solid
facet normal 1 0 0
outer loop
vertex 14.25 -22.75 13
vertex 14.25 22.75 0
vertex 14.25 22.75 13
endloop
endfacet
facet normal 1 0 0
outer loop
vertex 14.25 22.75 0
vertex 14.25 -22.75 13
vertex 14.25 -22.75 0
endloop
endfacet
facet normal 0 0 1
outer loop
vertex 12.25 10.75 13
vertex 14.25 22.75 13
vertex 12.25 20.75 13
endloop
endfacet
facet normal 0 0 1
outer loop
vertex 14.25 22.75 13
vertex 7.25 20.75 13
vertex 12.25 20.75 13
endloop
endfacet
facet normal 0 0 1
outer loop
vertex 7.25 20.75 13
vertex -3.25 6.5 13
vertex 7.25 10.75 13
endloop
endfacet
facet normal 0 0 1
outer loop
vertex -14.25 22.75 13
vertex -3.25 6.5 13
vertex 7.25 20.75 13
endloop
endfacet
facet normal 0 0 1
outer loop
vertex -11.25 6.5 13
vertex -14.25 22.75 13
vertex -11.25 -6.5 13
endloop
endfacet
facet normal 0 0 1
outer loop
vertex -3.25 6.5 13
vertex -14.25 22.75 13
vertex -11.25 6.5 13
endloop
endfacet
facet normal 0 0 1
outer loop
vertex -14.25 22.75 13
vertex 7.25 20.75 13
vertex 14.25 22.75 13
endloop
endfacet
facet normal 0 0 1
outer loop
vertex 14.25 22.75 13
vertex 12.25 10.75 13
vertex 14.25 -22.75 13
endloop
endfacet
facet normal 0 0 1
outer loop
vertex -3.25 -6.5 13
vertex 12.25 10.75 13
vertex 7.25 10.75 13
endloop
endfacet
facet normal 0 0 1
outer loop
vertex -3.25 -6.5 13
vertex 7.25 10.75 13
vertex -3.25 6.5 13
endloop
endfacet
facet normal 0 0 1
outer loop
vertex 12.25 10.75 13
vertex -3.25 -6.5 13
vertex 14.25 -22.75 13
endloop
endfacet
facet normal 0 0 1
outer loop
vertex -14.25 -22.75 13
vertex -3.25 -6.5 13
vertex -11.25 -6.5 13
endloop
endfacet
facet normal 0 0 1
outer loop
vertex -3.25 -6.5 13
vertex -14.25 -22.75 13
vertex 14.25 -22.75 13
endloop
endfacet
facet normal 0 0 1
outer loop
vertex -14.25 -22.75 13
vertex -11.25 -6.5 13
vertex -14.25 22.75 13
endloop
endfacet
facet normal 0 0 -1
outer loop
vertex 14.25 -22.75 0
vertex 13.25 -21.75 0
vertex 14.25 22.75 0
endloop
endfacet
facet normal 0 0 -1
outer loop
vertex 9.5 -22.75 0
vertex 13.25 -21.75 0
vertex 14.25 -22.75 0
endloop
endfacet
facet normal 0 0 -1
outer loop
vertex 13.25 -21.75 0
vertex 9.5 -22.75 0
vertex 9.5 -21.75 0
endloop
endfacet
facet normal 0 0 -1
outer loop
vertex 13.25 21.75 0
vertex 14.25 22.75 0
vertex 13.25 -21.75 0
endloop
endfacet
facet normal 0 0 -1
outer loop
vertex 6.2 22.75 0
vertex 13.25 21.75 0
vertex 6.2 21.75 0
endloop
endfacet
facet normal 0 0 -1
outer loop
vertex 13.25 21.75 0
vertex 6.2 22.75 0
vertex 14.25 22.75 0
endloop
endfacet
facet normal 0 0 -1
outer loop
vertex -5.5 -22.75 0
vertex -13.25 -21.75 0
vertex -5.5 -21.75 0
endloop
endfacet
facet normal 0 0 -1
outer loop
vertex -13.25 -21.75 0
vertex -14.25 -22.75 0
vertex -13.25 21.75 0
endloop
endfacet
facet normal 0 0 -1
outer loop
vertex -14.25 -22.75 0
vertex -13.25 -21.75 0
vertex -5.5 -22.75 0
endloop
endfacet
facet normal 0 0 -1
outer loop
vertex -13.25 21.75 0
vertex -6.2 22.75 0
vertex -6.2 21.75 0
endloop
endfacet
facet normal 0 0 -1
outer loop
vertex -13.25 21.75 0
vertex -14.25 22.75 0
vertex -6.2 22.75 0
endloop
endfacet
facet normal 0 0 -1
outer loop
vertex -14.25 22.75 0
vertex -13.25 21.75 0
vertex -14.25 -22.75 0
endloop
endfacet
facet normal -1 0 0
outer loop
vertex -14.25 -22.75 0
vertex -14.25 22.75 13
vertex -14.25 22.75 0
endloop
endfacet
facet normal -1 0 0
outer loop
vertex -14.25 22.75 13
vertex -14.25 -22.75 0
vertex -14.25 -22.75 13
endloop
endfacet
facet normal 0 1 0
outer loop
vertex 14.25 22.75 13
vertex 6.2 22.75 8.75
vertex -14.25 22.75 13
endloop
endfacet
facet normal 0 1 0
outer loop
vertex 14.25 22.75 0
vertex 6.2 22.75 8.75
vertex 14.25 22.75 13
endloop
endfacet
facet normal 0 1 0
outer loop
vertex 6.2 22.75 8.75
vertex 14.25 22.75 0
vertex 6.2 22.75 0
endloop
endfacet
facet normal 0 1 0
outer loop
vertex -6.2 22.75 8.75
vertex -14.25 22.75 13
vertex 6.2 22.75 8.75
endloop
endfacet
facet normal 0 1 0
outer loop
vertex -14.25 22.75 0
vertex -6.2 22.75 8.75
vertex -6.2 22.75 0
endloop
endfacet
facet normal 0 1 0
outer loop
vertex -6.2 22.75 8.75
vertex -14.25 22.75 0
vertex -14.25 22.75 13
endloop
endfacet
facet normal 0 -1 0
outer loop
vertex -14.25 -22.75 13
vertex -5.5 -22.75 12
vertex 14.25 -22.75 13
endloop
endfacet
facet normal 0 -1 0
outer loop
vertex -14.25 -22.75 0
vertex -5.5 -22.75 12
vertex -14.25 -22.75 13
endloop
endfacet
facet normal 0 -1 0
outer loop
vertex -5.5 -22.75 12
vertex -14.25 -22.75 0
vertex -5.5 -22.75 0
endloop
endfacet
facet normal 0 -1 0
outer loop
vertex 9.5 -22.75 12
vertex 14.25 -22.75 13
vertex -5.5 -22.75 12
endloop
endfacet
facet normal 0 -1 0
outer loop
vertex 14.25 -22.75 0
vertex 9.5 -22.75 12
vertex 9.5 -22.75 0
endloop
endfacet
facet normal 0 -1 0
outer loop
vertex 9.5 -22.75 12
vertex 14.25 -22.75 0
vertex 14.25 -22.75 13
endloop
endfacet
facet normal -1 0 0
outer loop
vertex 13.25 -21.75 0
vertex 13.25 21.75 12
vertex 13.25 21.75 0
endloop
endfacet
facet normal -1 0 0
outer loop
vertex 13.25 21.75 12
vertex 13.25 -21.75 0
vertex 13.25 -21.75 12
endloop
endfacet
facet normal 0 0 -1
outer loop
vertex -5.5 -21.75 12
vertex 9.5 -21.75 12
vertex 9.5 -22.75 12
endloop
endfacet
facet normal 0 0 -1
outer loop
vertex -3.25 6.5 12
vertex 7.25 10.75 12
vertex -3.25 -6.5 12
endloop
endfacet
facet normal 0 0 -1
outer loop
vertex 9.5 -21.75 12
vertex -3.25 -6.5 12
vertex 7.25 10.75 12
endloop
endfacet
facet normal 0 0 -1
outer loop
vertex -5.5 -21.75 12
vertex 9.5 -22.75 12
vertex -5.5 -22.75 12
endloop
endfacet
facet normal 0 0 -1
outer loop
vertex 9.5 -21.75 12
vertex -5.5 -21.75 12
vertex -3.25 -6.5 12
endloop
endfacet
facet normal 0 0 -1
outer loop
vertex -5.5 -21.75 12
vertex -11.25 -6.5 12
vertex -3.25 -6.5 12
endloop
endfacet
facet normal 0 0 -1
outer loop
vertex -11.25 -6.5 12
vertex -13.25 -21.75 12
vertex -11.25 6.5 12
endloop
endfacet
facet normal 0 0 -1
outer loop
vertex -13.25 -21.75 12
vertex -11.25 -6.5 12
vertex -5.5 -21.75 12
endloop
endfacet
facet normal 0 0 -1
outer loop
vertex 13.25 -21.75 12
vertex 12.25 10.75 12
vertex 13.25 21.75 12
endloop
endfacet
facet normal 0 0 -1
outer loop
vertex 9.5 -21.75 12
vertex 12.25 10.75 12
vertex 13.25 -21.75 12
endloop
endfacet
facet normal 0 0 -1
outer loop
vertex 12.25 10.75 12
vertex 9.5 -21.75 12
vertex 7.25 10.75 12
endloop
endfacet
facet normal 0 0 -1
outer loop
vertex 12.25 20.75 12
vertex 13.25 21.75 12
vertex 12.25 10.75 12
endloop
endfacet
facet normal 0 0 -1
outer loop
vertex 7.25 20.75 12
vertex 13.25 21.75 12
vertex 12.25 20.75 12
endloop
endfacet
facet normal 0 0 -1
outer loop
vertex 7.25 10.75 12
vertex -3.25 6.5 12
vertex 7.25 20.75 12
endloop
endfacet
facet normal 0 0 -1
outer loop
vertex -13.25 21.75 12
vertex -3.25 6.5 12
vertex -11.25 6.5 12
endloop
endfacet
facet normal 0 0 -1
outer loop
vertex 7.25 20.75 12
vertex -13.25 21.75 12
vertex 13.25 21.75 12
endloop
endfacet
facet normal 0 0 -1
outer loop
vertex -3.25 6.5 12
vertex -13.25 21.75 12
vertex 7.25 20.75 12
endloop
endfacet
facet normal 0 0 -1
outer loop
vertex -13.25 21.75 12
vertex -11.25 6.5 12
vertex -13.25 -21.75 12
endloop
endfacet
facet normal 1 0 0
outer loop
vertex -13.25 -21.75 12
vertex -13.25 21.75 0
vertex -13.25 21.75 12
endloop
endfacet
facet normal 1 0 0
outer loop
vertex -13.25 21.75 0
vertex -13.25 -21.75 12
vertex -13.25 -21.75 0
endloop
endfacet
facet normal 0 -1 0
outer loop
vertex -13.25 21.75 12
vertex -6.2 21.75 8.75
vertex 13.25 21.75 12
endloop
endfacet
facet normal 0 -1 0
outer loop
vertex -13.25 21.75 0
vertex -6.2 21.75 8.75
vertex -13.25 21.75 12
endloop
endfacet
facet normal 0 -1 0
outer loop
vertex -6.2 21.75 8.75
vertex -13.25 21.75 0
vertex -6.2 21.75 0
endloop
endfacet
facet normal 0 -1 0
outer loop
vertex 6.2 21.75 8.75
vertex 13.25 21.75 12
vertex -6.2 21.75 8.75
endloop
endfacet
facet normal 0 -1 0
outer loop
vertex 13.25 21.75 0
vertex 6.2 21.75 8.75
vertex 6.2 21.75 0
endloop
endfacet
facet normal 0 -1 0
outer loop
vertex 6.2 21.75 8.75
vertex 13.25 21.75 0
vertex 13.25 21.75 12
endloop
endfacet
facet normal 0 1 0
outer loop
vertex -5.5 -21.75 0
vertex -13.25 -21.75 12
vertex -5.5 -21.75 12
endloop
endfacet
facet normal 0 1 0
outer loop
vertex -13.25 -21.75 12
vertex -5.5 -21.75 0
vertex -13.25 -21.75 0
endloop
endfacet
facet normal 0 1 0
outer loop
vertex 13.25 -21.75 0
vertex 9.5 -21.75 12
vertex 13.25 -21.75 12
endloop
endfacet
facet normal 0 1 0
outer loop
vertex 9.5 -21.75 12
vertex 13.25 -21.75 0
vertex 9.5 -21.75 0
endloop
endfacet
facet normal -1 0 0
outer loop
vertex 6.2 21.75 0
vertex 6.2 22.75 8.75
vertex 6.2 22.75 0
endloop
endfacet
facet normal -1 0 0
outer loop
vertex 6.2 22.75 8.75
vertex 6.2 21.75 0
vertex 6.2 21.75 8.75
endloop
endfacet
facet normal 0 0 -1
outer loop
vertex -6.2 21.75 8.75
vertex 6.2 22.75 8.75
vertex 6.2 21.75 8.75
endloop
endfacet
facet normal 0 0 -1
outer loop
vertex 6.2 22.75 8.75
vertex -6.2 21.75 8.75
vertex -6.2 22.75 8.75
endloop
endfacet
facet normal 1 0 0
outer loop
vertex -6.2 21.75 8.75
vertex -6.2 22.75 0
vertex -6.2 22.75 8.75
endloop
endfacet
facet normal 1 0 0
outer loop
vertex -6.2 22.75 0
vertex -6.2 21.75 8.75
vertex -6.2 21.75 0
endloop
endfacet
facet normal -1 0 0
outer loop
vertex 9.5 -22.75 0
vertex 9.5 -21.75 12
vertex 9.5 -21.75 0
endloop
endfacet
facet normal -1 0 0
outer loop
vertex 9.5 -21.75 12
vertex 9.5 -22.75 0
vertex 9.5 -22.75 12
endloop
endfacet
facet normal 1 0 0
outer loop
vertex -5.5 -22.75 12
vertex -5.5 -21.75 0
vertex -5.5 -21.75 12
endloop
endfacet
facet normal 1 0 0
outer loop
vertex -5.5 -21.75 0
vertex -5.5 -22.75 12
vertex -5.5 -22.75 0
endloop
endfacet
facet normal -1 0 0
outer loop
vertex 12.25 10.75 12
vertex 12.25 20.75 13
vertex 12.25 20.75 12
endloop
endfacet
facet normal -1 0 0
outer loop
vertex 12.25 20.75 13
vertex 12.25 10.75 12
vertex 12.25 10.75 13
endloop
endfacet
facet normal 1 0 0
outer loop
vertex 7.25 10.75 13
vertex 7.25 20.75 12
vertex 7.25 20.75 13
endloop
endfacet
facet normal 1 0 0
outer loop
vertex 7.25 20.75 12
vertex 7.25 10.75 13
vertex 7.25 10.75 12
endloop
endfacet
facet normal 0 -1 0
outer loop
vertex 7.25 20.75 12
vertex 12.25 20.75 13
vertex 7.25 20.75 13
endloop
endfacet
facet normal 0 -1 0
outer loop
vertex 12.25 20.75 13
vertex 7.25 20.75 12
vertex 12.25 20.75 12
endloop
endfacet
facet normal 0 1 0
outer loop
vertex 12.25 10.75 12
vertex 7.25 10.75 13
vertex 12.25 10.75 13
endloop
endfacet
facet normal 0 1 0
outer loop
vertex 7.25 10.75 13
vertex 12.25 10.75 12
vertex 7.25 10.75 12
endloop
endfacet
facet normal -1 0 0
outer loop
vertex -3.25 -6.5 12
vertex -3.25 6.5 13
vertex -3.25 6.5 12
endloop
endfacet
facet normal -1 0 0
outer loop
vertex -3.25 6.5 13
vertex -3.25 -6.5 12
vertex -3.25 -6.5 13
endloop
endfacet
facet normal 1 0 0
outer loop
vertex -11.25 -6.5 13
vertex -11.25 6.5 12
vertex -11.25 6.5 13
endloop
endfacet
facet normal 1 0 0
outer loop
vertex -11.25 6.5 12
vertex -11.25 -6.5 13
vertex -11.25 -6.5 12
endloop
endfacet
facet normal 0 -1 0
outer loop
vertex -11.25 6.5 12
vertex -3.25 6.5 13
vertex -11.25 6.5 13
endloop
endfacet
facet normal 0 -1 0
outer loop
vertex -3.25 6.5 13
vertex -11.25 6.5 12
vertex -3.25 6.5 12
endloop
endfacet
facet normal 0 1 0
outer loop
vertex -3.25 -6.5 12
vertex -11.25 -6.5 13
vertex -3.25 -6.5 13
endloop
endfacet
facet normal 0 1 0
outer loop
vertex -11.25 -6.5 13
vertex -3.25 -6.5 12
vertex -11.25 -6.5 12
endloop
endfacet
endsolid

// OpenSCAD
top();
//%bottom();

module top(){
  difference(){
    translate([0,0,6.5]) cube([28.5, 45.5, 13], center=true);
    translate([0,0,5]) cube([26.5, 43.5, 14], center=true);
    
    translate([0,20,4.5-3.25]) 
      cube([12.4, 10, 15], center=true);
    translate([2,-20,6]) cube([15, 10, 12], center=true);
    
    translate([7.25,10.75,11.5]) cube([5,10,2]);
    translate([-11.25,-6.5,11.5]) cube([8,13,2]);
  }
}

module bottom(){
  difference(){
    translate([0,0,6]) cube([26, 43, 12], center=true);
    translate([0,0,8.5]) cube([24, 41, 14], center=true);
    
    translate([0,20,7.5+4]) cube([12.4, 10, 15], center=true);
    translate([2,-20,7.5+5]) cube([15, 10, 15], center=true);
  }
}
